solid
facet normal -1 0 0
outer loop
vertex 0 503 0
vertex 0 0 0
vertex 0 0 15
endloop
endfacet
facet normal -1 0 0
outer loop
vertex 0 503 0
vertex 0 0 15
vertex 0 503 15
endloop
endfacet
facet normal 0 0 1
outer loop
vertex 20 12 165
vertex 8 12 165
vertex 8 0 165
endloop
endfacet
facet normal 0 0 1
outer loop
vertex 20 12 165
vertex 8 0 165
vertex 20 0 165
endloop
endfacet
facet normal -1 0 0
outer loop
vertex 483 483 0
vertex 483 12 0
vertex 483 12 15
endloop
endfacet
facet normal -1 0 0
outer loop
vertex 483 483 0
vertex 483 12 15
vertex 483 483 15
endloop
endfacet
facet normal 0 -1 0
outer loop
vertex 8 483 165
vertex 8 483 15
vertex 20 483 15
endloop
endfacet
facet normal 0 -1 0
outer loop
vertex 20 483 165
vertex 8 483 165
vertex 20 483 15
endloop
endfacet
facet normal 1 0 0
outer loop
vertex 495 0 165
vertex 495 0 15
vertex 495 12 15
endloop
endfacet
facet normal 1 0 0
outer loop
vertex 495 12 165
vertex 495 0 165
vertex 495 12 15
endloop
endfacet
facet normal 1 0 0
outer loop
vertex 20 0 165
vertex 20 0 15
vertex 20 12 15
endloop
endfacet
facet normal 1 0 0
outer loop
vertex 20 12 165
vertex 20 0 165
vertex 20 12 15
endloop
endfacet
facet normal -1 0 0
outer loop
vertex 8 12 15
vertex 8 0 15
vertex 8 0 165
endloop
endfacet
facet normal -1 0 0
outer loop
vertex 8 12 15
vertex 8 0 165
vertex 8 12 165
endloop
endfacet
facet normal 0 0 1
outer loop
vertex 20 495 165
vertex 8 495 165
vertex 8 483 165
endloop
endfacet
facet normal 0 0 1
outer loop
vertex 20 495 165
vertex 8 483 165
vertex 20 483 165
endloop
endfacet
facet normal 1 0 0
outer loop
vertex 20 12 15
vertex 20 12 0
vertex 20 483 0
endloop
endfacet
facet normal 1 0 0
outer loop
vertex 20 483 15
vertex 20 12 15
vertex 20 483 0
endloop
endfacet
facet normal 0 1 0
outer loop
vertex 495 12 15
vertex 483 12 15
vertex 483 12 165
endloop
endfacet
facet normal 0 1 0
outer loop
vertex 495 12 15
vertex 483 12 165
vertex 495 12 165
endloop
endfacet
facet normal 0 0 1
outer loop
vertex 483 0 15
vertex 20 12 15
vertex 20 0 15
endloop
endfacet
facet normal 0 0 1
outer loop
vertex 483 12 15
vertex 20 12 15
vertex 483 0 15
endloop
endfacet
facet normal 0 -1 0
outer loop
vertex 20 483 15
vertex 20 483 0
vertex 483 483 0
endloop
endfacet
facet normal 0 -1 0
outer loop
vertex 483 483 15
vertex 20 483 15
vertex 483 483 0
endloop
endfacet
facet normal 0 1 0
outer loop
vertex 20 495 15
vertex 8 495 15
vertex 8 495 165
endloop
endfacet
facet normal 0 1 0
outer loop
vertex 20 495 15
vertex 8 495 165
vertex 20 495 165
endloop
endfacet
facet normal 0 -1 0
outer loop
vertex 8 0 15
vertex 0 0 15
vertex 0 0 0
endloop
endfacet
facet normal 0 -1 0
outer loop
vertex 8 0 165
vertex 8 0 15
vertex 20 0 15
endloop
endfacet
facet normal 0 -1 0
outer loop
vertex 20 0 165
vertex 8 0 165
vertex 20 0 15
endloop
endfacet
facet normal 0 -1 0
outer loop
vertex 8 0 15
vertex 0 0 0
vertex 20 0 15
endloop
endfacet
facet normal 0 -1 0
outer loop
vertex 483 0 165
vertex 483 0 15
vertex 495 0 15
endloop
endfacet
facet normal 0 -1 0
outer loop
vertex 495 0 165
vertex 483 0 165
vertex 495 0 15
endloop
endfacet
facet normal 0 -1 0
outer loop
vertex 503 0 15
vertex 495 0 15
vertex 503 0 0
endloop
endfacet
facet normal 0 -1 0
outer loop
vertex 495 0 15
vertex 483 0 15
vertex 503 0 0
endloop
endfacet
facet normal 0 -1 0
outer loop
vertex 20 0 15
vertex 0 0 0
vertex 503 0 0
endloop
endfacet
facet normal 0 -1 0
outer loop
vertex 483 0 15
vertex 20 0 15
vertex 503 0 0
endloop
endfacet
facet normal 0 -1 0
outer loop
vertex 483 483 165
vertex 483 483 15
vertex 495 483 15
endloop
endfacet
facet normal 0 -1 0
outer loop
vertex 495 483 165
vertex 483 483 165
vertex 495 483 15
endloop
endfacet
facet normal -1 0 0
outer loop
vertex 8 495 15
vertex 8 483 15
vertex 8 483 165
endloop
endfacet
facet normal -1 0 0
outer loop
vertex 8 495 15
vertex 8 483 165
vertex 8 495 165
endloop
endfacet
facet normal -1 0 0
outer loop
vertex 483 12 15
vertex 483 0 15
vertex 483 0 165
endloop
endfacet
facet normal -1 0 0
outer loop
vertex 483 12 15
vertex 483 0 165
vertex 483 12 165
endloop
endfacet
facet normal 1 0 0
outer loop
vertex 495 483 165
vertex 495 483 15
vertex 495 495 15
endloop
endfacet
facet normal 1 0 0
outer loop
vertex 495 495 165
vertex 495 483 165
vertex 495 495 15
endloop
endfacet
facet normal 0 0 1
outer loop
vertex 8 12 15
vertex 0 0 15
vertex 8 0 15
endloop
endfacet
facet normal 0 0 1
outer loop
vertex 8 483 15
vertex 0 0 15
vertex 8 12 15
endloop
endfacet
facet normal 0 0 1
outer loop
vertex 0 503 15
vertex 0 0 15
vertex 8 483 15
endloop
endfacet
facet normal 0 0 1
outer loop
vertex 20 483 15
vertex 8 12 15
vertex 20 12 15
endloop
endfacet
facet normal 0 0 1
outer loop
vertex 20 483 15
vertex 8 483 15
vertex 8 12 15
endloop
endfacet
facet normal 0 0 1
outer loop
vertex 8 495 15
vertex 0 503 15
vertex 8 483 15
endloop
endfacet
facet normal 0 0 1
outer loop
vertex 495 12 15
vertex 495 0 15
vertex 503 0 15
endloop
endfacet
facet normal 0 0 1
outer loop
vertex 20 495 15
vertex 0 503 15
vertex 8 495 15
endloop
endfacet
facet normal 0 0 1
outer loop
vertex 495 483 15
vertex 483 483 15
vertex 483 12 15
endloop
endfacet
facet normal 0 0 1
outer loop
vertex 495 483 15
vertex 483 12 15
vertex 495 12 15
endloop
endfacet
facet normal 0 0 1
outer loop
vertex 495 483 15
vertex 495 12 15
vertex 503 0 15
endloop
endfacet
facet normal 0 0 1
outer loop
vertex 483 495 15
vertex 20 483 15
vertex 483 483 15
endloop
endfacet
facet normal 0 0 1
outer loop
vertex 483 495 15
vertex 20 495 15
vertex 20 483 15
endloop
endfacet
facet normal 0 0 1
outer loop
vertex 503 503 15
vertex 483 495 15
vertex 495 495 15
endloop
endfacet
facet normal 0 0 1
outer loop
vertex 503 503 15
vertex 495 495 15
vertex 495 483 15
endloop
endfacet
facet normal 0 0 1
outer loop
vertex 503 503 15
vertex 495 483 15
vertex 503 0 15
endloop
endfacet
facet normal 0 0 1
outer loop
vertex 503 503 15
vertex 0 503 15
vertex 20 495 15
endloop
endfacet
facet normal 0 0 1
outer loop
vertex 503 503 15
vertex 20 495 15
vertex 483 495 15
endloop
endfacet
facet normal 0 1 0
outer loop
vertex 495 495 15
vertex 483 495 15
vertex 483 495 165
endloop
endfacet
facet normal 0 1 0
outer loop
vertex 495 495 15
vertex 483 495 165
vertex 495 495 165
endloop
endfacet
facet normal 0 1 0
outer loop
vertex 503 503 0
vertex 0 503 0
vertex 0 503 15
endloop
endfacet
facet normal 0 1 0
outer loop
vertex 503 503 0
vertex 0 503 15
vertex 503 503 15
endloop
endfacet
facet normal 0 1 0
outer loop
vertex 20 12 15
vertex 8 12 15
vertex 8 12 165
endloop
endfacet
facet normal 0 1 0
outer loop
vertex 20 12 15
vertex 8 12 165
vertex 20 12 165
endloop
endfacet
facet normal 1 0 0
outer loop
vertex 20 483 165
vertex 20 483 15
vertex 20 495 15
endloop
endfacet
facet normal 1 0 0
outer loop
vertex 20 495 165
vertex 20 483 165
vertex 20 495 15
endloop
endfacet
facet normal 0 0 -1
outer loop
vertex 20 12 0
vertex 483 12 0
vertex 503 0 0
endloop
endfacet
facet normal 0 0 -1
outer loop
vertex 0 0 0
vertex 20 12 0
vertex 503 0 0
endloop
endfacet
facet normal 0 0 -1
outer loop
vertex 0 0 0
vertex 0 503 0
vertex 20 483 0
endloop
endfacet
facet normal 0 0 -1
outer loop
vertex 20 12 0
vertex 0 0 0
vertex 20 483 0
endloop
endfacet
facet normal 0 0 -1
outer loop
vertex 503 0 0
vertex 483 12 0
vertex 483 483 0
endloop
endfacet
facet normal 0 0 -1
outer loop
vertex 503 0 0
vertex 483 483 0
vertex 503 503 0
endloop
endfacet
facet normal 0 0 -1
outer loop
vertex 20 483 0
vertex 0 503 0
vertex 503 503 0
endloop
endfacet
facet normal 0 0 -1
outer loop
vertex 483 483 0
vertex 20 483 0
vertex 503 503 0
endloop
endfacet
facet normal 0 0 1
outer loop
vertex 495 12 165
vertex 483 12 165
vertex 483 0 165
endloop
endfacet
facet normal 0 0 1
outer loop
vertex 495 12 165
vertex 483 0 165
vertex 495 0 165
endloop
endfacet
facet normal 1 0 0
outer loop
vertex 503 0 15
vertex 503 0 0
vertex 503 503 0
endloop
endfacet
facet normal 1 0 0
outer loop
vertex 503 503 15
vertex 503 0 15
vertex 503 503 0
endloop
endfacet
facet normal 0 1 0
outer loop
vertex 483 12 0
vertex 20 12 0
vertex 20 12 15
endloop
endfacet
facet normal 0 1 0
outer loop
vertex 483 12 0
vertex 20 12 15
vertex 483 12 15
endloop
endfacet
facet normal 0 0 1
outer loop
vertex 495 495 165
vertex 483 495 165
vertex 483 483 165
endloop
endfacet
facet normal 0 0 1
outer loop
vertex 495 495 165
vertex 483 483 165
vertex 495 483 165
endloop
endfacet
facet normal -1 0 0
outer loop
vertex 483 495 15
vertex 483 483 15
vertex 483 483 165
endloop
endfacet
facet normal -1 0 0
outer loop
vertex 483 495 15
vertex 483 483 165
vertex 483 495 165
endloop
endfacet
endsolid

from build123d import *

# Parameters (mm, degrees)
SKETCH1_W           = 503
SKETCH1_H           = 503
SKETCH1_W_2         = 463
SKETCH1_H_2         = 471
BOSS_EXTRUDE1_DEPTH = 15
SKETCH2_W           = 12
SKETCH2_H           = 12
BOSS_EXTRUDE2_DEPTH = 200
SKETCH3_W           = 487
SKETCH3_H           = 495
CUT_EXTRUDE1_DEPTH  = 50


with BuildPart() as part:
    # Sketch1 → Boss-Extrude1 (new body)
    with BuildSketch(Plane.XY):
        with Locations((251.5, 251.5)):
            Rectangle(SKETCH1_W, SKETCH1_H)
        with Locations((251.5, 247.5)):
            Rectangle(SKETCH1_W_2, SKETCH1_H_2, mode=Mode.SUBTRACT)
    extrude(amount=BOSS_EXTRUDE1_DEPTH)

    # Sketch2 → Boss-Extrude2 (add)
    with BuildSketch(Plane.XY.offset(15)):
        with Locations((14, 489)):
            Rectangle(SKETCH2_W, SKETCH2_H)
        with Locations((489, 489)):
            Rectangle(SKETCH2_W, SKETCH2_H)
        with Locations((14, 6)):
            Rectangle(SKETCH2_W, SKETCH2_H)
        with Locations((489, 6)):
            Rectangle(SKETCH2_W, SKETCH2_H)
    extrude(amount=BOSS_EXTRUDE2_DEPTH)

    # Sketch3 → Cut-Extrude1 (cut)
    with BuildSketch(Plane.XY.offset(215)):
        with Locations((251.5, 247.5)):
            Rectangle(SKETCH3_W, SKETCH3_H)
    extrude(amount=-CUT_EXTRUDE1_DEPTH, mode=Mode.SUBTRACT)


solid = part.part
